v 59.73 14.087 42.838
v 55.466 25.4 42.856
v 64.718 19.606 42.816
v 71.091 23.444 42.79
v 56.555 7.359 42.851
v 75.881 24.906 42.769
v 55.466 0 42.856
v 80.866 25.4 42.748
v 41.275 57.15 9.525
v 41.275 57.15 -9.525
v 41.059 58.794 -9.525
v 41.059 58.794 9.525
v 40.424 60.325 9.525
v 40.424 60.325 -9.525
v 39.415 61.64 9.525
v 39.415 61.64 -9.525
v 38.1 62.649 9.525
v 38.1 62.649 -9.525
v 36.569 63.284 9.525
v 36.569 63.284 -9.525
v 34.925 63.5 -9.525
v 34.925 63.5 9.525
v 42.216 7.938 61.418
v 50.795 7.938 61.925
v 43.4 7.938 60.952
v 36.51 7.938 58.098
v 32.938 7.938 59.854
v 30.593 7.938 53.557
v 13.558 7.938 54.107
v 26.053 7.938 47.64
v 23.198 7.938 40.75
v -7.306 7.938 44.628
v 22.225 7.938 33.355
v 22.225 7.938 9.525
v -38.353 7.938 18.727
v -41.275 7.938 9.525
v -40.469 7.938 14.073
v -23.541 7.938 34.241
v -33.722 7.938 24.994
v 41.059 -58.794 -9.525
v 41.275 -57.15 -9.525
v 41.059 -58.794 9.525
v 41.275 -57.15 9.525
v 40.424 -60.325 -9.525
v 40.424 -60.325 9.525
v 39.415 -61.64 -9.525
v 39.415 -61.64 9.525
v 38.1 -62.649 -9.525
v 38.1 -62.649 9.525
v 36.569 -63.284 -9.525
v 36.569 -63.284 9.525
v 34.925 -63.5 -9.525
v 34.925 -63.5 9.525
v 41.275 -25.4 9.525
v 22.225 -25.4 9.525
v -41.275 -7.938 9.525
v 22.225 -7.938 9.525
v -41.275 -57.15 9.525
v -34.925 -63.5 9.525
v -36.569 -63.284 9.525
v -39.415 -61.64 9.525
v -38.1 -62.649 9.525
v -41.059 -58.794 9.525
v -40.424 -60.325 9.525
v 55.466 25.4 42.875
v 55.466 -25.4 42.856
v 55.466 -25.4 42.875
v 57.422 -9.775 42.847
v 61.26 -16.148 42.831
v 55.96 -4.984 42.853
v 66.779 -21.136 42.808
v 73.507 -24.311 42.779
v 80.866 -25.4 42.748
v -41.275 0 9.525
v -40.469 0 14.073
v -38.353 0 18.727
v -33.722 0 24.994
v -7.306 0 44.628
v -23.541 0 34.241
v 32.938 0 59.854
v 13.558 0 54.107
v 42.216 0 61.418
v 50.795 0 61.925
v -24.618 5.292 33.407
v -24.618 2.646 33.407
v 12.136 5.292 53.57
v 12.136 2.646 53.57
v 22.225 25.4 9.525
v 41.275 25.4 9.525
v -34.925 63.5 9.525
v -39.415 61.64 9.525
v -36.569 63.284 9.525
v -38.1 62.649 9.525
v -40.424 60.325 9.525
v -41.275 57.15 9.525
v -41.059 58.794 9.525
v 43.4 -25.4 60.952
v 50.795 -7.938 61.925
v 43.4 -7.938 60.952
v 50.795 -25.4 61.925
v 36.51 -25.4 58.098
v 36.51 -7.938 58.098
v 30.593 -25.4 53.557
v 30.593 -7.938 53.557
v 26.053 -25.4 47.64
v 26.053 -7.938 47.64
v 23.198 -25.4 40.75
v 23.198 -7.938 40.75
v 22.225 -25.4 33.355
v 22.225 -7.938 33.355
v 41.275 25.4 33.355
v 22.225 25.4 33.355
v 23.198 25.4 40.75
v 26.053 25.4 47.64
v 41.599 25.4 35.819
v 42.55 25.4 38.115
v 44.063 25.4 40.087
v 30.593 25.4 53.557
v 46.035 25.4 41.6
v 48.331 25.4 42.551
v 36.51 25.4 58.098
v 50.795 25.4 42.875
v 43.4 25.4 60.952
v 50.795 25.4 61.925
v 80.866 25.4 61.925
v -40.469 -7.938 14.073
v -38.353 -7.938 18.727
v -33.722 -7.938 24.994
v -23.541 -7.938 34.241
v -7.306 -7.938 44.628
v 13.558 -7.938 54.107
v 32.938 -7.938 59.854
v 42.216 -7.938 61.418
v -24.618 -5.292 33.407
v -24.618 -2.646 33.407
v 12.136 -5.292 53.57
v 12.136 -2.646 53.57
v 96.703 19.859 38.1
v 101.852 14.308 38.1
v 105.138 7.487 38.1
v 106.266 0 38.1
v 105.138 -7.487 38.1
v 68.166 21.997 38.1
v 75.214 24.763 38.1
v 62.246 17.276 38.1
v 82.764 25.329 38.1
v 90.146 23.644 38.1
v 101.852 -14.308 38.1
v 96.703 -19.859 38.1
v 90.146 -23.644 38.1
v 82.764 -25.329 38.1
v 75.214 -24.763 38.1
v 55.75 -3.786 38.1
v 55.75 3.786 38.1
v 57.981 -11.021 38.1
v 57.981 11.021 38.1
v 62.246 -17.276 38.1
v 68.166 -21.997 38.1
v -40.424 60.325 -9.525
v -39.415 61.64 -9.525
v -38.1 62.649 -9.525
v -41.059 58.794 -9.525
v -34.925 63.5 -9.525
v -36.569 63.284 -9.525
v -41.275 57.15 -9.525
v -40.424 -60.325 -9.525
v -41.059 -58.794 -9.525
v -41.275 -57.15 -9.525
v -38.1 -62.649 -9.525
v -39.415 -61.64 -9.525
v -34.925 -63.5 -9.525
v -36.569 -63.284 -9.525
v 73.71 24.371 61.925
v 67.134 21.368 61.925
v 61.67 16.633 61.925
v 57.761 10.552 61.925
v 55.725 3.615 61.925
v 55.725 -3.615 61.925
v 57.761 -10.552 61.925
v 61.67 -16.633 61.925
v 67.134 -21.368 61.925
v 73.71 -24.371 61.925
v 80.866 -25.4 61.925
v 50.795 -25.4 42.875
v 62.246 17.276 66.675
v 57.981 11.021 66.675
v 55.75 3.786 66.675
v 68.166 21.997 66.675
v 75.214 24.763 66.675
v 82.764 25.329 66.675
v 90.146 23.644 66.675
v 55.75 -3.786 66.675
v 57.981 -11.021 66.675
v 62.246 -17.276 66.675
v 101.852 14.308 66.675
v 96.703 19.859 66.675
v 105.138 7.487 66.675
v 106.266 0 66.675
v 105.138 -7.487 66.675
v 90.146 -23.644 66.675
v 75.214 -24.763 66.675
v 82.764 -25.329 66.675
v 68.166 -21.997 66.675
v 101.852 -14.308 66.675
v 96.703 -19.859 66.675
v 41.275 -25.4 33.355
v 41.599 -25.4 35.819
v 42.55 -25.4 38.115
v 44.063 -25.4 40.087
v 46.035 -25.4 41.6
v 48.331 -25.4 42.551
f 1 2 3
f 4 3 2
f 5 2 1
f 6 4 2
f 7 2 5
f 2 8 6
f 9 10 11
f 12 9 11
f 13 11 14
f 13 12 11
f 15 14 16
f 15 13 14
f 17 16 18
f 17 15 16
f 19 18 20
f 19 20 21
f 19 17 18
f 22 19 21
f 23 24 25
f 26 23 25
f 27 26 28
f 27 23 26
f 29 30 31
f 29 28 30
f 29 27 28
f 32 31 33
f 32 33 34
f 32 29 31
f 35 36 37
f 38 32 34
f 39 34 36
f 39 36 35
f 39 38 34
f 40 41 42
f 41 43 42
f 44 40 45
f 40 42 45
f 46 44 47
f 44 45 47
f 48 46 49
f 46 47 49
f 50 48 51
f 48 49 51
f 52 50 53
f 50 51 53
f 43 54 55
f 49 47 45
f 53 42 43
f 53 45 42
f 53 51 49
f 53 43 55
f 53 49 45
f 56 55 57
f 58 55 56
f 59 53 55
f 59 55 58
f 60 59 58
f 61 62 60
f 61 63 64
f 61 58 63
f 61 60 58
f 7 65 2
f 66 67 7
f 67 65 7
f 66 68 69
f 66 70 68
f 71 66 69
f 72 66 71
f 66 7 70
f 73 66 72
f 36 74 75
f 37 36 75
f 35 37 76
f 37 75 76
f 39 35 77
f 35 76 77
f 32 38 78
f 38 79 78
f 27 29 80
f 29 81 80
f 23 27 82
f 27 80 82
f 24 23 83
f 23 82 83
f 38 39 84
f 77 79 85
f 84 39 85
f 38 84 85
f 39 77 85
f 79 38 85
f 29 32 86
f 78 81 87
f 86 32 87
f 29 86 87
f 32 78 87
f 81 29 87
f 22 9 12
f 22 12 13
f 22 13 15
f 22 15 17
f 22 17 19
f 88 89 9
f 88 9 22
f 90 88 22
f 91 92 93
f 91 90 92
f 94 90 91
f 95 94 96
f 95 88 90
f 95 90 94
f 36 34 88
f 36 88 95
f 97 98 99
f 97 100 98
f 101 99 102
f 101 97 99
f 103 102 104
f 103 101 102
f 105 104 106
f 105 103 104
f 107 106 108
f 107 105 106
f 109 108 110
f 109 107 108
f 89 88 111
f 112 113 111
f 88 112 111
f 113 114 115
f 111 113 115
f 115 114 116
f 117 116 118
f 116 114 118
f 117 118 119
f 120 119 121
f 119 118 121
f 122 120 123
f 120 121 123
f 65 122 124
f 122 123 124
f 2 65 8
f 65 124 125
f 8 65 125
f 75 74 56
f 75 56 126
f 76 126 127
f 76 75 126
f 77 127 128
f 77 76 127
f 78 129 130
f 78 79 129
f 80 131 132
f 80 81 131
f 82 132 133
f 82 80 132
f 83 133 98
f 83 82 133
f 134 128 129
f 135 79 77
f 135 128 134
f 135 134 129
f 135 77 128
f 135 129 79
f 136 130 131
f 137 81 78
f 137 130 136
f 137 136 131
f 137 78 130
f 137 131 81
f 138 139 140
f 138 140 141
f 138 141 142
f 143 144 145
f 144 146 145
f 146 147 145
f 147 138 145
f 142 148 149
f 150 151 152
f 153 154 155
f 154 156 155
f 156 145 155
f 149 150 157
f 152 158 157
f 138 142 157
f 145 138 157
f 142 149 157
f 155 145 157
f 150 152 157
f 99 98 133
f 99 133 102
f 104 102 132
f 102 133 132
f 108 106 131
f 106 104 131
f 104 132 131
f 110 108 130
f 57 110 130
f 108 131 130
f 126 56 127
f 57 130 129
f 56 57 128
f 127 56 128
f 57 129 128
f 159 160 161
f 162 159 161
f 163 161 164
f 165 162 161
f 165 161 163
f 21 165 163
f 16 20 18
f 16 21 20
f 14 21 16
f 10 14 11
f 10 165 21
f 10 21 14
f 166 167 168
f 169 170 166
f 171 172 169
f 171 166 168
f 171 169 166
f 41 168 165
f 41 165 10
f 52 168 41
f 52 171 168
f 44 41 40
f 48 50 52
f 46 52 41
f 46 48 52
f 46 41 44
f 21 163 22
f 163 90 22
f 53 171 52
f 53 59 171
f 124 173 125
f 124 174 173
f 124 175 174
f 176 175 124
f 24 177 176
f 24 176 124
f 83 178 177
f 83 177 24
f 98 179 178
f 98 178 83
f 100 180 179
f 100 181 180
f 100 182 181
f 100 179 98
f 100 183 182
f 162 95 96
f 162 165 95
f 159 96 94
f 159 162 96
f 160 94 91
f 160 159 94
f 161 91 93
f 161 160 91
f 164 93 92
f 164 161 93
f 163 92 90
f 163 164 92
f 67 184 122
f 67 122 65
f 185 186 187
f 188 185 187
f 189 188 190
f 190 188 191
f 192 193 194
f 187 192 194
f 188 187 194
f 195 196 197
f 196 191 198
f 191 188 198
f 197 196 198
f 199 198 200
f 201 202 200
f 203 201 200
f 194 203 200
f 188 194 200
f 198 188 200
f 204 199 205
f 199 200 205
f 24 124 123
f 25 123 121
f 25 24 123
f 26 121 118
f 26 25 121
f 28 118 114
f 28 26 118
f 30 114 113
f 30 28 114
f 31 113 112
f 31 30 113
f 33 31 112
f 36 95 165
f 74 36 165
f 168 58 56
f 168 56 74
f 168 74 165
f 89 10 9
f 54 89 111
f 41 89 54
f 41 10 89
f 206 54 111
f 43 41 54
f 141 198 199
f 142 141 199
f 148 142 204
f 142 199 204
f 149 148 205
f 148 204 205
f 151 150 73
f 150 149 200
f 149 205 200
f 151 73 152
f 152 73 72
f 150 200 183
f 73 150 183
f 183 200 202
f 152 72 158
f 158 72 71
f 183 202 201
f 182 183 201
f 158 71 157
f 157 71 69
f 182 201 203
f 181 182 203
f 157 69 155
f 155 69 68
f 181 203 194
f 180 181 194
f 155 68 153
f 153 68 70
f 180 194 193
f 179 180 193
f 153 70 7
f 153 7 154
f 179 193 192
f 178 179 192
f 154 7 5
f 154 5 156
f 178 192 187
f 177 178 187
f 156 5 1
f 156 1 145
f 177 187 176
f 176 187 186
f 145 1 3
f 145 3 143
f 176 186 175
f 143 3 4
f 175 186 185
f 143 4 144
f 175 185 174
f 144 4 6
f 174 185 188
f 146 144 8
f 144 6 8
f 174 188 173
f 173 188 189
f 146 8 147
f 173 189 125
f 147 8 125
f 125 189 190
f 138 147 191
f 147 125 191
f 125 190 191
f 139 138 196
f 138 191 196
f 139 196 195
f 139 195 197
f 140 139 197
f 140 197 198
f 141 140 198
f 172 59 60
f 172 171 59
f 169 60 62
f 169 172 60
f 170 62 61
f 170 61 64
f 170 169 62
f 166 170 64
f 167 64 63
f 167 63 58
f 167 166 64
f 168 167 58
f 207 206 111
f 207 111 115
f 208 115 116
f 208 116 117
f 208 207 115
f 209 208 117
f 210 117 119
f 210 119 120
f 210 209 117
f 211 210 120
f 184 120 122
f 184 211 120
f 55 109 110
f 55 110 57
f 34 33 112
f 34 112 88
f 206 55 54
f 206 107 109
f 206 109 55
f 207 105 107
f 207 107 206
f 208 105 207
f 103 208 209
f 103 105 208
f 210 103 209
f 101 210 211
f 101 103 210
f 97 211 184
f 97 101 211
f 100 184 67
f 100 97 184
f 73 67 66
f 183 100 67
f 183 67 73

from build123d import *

# Parameters (mm, degrees)
F1_DEPTH = 63.5
F2_DEPTH = 25.4
F3_DEPTH = 7.9375
F5_R     = 6.35


with BuildPart() as f1:
    # F0 (on Front) → F1 (new body, symmetric)
    with BuildSketch(Plane.XZ):
        Polygon((-41.275, -9.525), (41.275, -9.525), (41.275, 9.525), (22.225, 9.525), (-41.275, 9.525), align=None)
    extrude(amount=F1_DEPTH, both=True)

    # F0 (on Front) → F2 (join, symmetric)
    with BuildSketch(Plane.XZ):
        with BuildLine():
            Line((22.225, 9.525), (41.275, 9.525))
            Line((41.275, 9.525), (41.275, 33.3553104297))
            ThreePointArc((41.275, 33.3553104297), (44.063311099, 40.086888901), (50.7948895703, 42.8752))
            Line((50.7948895703, 42.8752), (55.4659834841, 42.8752))
            Line((55.4659834841, 42.8752), (55.4659834841, 61.9252))
            Line((55.4659834841, 61.9252), (50.7948895703, 61.9252))
            ThreePointArc((50.7948895703, 61.9252), (30.5929269174, 53.5572730826), (22.225, 33.3553104297))
            Line((22.225, 33.3553104297), (22.225, 9.525))
        make_face()
        Polygon((70.8683976346, 61.9252), (55.4659834841, 61.9252), (55.4659834841, 42.8752), (55.4659834841, 42.8555016406), (80.8659834841, 42.748387903), (80.8659834841, 61.9252), align=None)
    extrude(amount=F2_DEPTH, both=True)

    # F0 (on Front) → F3 (join, symmetric)
    with BuildSketch(Plane.XZ):
        with BuildLine():
            add(Edge.make_bspline(
                [(-41.275, 9.525), (-40.730714798, 32.5702540576), (17.2467883676, 62.170214951), (50.7948895703, 61.9252)],
                knots=[0, 0, 0, 0, 105.9369884673, 105.9369884673, 105.9369884673, 105.9369884673], degree=3))
            Line((-41.275, 9.525), (22.225, 9.525))
            Line((22.225, 9.525), (22.225, 33.3553104297))
            ThreePointArc((22.225, 33.3553104297), (30.5929269174, 53.5572730826), (50.7948895703, 61.9252))
        make_face()
    extrude(amount=F3_DEPTH, both=True)

    # F0 (on Front) → F4 (revolve)
    with BuildSketch(Plane.XZ):
        Polygon((80.8659834841, 61.9252), (80.8659834841, 42.748387903), (80.8659834841, 38.1), (106.2659834841, 38.1), (106.2659834841, 66.675), (80.8659834841, 66.675), align=None)
    revolve(axis=Axis((80.8659834841, 0, 52.3875), (0, 0, -1)))

    # F5
    f5_edges = [f1.edges().sort_by_distance(p)[0] for p in [
        (-41.275, -63.5, 0),
        (41.275, -63.5, 0),
        (41.275, 63.5, 0),
        (-41.275, 63.5, 0),
    ]]
    fillet(f5_edges, radius=F5_R)


solid = f1.part
